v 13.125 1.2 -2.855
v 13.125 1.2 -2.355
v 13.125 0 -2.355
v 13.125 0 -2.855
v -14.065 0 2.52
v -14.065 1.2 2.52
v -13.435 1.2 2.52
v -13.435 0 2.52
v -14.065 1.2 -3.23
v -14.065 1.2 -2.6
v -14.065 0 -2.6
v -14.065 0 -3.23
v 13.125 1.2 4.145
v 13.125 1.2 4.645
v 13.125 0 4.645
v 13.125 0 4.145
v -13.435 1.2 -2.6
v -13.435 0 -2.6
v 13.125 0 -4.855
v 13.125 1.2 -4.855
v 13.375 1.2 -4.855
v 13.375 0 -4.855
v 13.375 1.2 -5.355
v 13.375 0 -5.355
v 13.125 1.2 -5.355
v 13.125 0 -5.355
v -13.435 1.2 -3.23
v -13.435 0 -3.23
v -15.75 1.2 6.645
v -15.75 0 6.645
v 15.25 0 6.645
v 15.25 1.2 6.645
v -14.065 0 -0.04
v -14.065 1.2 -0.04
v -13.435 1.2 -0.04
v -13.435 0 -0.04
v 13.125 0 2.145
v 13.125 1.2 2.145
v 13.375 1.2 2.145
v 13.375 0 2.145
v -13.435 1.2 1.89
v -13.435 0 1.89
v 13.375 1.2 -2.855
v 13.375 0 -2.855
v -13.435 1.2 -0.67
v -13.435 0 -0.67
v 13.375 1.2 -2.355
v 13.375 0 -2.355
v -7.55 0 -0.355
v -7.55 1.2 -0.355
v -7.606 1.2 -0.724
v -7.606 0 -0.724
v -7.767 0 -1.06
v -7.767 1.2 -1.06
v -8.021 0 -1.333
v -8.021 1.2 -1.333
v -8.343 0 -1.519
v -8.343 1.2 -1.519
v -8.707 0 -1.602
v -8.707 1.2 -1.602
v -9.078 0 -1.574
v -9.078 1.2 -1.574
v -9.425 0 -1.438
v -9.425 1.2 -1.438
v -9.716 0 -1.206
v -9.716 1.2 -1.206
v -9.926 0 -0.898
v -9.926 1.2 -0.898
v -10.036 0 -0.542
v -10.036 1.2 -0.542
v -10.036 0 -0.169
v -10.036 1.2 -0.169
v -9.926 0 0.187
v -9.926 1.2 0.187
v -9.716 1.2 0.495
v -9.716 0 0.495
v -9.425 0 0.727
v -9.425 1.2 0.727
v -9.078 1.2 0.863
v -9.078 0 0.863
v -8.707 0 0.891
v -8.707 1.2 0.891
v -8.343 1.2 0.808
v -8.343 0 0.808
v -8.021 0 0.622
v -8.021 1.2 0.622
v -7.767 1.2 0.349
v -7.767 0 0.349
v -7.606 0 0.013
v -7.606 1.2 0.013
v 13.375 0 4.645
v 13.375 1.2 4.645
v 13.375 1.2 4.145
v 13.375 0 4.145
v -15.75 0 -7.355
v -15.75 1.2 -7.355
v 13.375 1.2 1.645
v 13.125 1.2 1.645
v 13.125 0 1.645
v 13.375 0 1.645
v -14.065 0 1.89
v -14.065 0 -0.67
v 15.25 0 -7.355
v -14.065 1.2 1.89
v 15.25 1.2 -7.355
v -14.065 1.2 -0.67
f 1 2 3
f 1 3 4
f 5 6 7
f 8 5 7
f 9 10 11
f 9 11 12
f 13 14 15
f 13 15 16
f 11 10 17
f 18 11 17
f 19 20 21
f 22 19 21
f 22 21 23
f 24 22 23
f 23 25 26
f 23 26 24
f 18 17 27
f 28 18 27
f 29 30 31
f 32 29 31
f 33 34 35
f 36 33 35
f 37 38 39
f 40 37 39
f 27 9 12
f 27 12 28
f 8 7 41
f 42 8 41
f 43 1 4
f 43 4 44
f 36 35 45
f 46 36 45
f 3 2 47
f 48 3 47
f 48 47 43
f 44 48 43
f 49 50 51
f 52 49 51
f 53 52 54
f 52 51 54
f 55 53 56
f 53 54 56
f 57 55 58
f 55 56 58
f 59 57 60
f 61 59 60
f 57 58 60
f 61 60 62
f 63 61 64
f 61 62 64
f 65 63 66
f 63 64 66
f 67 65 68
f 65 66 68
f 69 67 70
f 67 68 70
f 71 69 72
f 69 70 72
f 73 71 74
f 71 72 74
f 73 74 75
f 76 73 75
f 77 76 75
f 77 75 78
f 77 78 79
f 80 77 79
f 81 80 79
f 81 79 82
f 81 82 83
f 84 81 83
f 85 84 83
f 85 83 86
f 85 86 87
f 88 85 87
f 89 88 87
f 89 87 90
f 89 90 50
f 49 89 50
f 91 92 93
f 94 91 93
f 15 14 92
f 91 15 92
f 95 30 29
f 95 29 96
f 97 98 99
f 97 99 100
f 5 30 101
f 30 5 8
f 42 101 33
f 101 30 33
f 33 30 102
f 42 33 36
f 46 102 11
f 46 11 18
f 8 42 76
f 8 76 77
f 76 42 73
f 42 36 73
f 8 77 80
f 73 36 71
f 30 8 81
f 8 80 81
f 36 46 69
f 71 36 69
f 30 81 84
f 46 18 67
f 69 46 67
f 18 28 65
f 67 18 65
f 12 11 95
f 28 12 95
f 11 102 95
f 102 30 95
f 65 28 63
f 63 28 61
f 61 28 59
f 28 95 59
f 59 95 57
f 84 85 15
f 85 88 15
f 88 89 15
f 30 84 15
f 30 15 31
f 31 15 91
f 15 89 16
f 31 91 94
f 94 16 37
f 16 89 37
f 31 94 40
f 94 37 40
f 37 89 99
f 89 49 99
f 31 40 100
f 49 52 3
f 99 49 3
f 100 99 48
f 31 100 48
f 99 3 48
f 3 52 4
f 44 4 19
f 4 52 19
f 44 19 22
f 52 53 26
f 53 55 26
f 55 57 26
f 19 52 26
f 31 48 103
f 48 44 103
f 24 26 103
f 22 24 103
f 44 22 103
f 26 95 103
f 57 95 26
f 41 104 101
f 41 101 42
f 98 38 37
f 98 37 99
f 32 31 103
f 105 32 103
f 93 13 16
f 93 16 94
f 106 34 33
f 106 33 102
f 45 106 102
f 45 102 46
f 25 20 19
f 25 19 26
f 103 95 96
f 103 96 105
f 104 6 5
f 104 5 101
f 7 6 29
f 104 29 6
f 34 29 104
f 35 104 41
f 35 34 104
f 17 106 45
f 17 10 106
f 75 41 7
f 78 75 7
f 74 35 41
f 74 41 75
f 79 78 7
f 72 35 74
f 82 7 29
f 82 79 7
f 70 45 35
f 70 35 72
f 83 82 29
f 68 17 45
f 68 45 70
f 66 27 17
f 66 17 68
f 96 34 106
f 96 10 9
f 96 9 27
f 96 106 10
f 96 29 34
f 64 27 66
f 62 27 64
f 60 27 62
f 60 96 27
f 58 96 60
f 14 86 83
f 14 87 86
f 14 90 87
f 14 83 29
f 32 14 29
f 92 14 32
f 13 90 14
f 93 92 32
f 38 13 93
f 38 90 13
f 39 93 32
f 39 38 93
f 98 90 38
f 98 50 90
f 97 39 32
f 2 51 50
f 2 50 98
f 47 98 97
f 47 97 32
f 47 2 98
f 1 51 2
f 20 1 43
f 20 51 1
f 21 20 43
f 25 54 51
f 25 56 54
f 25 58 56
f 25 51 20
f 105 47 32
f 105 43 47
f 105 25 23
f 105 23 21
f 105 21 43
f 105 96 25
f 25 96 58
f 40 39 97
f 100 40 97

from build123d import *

# Parameters (mm, degrees)
SKETCH1_W           = 31
SKETCH1_H           = 14
BOSS_EXTRUDE1_DEPTH = 1.2
SKETCH2_R           = 1.25
SKETCH2_W           = 0.63
SKETCH2_H           = 0.63
SKETCH2_W_2         = 0.25
SKETCH2_H_2         = 0.5
CUT_EXTRUDE1_DEPTH  = 2.2


with BuildPart() as part:
    # Sketch1 → Boss-Extrude1 (new body)
    with BuildSketch(Plane(origin=(0, 0, 0), x_dir=(1, 0, 0), z_dir=(0, 1, 0))):
        with Locations((-0.25, 0.35546875)):
            Rectangle(SKETCH1_W, SKETCH1_H)
    extrude(amount=BOSS_EXTRUDE1_DEPTH)

    # Sketch2 → Cut-Extrude1 (cut, through all)
    with BuildSketch(Plane(origin=(0, 1.2, 0), x_dir=(1, 0, 0), z_dir=(0, 1, 0))):
        with Locations((-8.8, 0.35546875)):
            Circle(SKETCH2_R)
        with Locations((-13.75, 2.91546875)):
            Rectangle(SKETCH2_W, SKETCH2_H)
        with Locations((-13.75, 0.35546875)):
            Rectangle(SKETCH2_W, SKETCH2_H)
        with Locations((-13.75, -2.20453125)):
            Rectangle(SKETCH2_W, SKETCH2_H)
        with Locations((13.25, -4.39453125)):
            Rectangle(SKETCH2_W_2, SKETCH2_H_2)
        with Locations((13.25, -1.89453125)):
            Rectangle(SKETCH2_W_2, SKETCH2_H_2)
        with Locations((13.25, 2.60546875)):
            Rectangle(SKETCH2_W_2, SKETCH2_H_2)
        with Locations((13.25, 5.10546875)):
            Rectangle(SKETCH2_W_2, SKETCH2_H_2)
    extrude(amount=-CUT_EXTRUDE1_DEPTH, mode=Mode.SUBTRACT)


solid = part.part
